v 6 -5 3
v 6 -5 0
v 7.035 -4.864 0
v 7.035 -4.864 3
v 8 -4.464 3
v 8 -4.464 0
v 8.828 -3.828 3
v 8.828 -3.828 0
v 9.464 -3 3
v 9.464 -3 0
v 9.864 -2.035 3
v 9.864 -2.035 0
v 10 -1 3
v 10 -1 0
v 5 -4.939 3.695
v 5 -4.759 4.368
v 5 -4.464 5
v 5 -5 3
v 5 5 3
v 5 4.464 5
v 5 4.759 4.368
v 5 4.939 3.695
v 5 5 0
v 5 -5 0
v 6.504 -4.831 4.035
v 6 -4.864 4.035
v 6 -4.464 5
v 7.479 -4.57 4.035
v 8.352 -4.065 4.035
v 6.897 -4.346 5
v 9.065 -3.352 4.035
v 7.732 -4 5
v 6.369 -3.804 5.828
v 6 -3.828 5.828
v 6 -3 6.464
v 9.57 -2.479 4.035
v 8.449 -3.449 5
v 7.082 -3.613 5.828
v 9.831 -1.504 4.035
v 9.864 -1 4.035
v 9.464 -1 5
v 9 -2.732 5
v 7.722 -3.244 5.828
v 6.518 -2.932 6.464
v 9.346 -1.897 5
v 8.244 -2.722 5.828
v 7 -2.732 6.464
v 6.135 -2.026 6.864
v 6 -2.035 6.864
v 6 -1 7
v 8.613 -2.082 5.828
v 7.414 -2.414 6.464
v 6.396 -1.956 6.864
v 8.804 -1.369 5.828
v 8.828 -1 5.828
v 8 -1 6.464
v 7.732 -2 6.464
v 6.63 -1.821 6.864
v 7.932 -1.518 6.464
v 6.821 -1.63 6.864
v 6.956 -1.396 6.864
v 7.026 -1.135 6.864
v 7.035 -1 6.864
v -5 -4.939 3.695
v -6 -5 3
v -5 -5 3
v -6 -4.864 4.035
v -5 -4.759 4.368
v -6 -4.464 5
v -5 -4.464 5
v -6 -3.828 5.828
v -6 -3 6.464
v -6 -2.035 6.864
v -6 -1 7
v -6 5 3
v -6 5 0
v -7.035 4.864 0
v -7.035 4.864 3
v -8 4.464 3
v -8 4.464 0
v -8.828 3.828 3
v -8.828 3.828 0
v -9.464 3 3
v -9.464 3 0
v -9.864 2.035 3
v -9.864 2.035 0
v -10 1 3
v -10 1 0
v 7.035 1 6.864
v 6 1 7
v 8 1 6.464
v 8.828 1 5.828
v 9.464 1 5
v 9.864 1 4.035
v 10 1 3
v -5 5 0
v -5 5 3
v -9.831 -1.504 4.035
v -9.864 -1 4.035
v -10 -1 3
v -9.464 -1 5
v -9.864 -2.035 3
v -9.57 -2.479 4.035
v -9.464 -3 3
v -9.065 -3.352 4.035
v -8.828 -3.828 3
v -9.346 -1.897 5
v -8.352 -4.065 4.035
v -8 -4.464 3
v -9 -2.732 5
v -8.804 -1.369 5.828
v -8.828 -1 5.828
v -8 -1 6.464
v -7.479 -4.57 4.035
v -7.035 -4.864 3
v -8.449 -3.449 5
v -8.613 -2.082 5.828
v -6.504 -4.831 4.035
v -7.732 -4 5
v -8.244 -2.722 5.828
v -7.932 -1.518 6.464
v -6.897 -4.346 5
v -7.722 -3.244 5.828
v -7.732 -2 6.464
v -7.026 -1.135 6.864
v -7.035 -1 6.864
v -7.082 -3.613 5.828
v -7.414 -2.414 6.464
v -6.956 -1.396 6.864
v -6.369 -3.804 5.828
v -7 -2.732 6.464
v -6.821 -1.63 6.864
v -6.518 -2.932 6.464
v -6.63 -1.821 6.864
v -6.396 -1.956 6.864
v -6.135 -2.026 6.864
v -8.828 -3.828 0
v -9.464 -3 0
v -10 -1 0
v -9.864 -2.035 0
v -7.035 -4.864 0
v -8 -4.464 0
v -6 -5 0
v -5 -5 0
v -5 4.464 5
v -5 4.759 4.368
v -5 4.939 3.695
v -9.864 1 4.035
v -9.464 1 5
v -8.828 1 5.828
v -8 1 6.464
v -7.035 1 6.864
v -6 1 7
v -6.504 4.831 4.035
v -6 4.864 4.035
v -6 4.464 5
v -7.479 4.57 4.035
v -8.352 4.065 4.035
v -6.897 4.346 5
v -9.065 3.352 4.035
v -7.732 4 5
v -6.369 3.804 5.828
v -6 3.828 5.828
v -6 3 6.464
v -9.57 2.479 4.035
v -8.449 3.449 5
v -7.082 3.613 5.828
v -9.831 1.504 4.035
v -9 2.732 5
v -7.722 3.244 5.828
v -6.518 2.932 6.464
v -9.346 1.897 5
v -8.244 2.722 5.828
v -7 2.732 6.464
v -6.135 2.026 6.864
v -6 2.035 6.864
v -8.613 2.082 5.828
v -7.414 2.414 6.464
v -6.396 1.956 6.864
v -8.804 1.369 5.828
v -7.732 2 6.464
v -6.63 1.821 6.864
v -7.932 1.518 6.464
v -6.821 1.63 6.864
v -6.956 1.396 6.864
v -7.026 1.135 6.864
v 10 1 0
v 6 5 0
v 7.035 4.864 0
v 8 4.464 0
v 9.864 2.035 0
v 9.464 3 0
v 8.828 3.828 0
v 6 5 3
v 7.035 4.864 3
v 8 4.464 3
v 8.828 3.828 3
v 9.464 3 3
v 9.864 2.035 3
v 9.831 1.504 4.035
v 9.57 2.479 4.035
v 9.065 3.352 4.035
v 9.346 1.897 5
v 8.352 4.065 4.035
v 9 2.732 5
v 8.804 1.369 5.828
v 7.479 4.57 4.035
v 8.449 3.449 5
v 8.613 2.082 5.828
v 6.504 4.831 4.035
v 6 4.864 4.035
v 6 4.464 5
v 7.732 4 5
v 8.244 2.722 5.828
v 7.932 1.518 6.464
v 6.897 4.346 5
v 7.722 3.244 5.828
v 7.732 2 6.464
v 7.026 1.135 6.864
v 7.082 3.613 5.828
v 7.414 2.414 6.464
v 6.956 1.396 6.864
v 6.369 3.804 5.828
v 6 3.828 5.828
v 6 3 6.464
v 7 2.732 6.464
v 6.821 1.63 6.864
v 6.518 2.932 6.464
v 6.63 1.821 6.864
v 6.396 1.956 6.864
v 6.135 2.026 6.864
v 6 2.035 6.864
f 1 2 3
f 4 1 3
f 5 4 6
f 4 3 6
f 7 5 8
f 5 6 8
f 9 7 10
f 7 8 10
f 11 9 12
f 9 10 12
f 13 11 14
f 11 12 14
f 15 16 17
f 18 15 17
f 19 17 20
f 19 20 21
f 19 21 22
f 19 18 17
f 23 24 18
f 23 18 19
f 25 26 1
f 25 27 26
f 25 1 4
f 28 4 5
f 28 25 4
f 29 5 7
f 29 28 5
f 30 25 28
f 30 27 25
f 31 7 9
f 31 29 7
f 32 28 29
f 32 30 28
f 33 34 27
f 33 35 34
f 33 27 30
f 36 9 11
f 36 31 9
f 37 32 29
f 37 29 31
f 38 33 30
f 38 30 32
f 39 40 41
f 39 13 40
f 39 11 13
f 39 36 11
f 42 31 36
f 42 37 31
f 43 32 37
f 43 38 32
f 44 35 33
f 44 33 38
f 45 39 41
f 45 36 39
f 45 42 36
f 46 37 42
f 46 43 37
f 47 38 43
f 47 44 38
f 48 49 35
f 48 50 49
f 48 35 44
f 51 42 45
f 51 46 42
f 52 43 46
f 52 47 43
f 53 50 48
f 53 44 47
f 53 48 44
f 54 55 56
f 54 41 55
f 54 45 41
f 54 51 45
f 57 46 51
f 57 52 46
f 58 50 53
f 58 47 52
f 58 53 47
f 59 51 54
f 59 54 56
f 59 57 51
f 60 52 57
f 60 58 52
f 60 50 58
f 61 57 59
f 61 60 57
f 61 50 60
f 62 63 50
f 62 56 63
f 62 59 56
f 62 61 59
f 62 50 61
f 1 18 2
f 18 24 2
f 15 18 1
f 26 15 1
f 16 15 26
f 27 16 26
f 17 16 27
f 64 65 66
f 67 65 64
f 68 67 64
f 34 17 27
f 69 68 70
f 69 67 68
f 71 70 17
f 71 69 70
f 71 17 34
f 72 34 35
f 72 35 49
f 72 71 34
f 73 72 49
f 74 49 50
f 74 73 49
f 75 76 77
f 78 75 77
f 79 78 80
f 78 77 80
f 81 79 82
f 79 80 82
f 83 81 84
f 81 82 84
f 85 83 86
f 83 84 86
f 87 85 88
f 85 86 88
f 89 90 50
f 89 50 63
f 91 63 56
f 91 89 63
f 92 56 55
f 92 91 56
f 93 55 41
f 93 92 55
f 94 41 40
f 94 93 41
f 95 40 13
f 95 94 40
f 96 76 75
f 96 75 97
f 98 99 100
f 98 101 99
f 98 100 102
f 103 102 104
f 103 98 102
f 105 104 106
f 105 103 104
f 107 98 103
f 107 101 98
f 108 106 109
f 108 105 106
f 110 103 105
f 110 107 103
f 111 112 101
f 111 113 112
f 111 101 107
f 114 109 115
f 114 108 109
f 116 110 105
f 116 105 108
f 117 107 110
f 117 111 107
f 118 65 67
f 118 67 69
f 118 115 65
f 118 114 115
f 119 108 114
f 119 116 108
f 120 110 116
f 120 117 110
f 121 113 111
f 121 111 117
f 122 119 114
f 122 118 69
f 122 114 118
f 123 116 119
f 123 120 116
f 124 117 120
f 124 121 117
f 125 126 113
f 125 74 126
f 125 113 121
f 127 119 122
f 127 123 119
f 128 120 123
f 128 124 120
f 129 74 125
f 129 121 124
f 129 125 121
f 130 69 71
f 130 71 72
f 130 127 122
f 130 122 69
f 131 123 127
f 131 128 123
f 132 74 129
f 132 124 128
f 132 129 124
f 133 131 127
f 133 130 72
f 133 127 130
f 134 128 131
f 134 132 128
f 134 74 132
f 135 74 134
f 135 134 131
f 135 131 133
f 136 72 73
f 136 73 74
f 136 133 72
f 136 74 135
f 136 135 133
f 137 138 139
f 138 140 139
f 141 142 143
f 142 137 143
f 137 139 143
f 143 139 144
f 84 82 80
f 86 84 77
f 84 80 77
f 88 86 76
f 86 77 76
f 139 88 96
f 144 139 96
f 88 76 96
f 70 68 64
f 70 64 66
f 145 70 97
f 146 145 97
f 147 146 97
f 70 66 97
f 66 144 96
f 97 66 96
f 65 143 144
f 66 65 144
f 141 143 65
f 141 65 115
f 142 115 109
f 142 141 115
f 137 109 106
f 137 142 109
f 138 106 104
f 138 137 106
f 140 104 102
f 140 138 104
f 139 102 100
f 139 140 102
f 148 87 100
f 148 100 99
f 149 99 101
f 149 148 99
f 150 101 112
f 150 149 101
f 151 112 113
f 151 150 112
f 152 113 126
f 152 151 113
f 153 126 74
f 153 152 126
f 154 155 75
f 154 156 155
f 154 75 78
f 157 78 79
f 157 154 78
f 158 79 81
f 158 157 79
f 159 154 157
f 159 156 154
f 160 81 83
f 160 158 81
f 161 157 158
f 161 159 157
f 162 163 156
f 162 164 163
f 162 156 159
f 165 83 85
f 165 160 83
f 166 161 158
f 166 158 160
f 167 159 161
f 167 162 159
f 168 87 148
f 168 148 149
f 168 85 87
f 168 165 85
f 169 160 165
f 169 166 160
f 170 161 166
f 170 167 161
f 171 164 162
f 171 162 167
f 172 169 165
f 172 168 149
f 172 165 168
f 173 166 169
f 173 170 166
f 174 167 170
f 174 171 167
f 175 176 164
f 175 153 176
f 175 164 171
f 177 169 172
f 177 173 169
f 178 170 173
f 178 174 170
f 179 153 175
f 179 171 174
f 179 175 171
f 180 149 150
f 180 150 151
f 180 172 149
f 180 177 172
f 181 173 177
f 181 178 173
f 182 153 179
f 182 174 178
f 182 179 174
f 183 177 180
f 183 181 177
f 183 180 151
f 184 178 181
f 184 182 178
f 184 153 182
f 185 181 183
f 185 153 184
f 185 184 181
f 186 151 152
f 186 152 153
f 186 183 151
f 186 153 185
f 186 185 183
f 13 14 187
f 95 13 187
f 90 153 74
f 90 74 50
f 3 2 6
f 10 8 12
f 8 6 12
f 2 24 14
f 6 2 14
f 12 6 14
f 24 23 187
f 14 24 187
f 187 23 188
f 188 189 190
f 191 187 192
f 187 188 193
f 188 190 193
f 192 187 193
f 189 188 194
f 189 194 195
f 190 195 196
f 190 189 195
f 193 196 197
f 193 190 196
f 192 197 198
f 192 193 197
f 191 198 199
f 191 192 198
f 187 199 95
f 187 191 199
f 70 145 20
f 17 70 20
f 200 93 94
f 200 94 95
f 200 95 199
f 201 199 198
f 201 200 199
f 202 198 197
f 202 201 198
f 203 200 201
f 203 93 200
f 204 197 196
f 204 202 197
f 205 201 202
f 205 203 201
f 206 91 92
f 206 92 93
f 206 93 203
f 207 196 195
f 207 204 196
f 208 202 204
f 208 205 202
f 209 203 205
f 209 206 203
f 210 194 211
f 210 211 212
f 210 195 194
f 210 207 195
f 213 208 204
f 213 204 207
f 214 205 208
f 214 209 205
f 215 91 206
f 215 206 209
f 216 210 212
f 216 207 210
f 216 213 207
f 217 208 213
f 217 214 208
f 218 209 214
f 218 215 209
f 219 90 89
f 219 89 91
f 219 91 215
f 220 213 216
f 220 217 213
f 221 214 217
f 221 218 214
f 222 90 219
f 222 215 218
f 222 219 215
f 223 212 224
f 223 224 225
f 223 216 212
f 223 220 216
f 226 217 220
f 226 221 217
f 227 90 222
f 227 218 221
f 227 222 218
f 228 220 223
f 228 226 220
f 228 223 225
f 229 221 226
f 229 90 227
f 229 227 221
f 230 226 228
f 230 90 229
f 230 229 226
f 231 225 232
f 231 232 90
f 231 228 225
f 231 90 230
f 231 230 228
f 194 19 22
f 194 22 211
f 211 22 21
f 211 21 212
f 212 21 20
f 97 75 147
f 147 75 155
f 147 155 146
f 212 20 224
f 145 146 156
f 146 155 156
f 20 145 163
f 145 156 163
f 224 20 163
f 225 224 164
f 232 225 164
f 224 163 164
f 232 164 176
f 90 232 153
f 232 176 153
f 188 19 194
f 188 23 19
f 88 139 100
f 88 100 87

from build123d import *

# Parameters (mm, degrees)
F0_W         = 5
F0_H         = 10
F1_DEPTH     = 5
F2_W         = 20
F2_H         = 10
F3_DEPTH     = 2
F4_T1_DEPTH  = 2
F4_T3_DEPTH  = 12
F4_T5_DEPTH  = 13
F4_S9_W      = 4
F4_S9_H      = 4
F4_T10_DEPTH = 4
F4_S15_W     = 4
F4_S15_H     = 4
F4_T16_DEPTH = 4
F4_S21_W     = 4
F4_S21_H     = 4
F4_T22_DEPTH = 4
F4_S27_W     = 4
F4_S27_H     = 4
F4_T28_DEPTH = 4


# Not quite as in the source:
# - a fillet or chamfer that OpenCascade refuses, or shapes differently, is made with other operations: its cross-section is extruded or revolved along the edge and cut away or added


with BuildPart() as f1:
    # F0 (on Top) → F1 (new body)
    with BuildSketch(Plane.XY):
        with Locations((-7.5, 0)):
            Rectangle(F0_W, F0_H)
    extrude(amount=F1_DEPTH)



with BuildPart() as f1b:
    # F0 (on Top) → F1, piece 2 (new body)
    with BuildSketch(Plane.XY):
        with Locations((7.5, 0)):
            Rectangle(F0_W, F0_H)
    extrude(amount=F1_DEPTH)


with BuildPart() as f1_1:
    add(f1.part)

    add(f1b.part)  # F3 merges F1b
    # F2 (on face) → F3 (join)
    with BuildSketch(Plane.XY.offset(5)):
        Rectangle(F2_W, F2_H)
    extrude(amount=F3_DEPTH)

    # F4: fillet of radius 4 on 8 edges, made by hand

    # F4_s2 → F4_t1 (cut)
    with BuildSketch(Plane.XZ.offset(-1)):
        with BuildLine():
            ThreePointArc((-10, 3), (-8.8284271247, 5.8284271247), (-6, 7))
            Line((-6, 7), (-10, 7))
            Line((-10, 7), (-10, 3))
        make_face()
        with BuildLine():
            ThreePointArc((6, 7), (8.8284271247, 5.8284271247), (10, 3))
            Line((10, 3), (10, 7))
            Line((10, 7), (6, 7))
        make_face()
    extrude(amount=F4_T1_DEPTH, mode=Mode.SUBTRACT)

    # F4_s4 → F4_t3 (cut)
    with BuildSketch(Plane.YZ.offset(-6)):
        with BuildLine():
            ThreePointArc((-5, 3), (-3.8284271247, 5.8284271247), (-1, 7))
            Line((-1, 7), (-5, 7))
            Line((-5, 7), (-5, 3))
        make_face()
        with BuildLine():
            ThreePointArc((5, 3), (3.8284271247, 5.8284271247), (1, 7))
            Line((1, 7), (5, 7))
            Line((5, 7), (5, 3))
        make_face()
    extrude(amount=F4_T3_DEPTH, mode=Mode.SUBTRACT)

    # F4_s6 → F4_t5 (cut)
    with BuildSketch(Plane.XY.offset(-10)):
        with BuildLine():
            ThreePointArc((6, -5), (8.8284271247, -3.8284271247), (10, -1))
            Line((10, -1), (10, -5))
            Line((10, -5), (6, -5))
        make_face()
        with BuildLine():
            ThreePointArc((6, 5), (8.8284271247, 3.8284271247), (10, 1))
            Line((10, 1), (10, 5))
            Line((10, 5), (6, 5))
        make_face()
        with BuildLine():
            ThreePointArc((-6, 5), (-8.8284271247, 3.8284271247), (-10, 1))
            Line((-10, 1), (-10, 5))
            Line((-10, 5), (-6, 5))
        make_face()
        with BuildLine():
            ThreePointArc((-6, -5), (-8.8284271247, -3.8284271247), (-10, -1))
            Line((-10, -1), (-10, -5))
            Line((-10, -5), (-6, -5))
        make_face()
    extrude(amount=F4_T5_DEPTH, mode=Mode.SUBTRACT)


with BuildPart() as f4_tool8:
    # F4_s9 → F4_t10 (new body)
    with BuildSketch(Plane.XY.offset(3)):
        with Locations((-8, 3)):
            Rectangle(F4_S9_W, F4_S9_H)
    extrude(amount=F4_T10_DEPTH)

    # F4_s11 → F4_t12 (revolve, cut)
    with BuildSketch(Plane(origin=(-6, 1, 3), x_dir=(0.7071067812, -0.7071067812, 0), z_dir=(-0.7071067812, -0.7071067812, 0))):
        with BuildLine():
            ThreePointArc((0, -4), (4, 0), (0, 4))
            Line((0, 4), (0, -4))
        make_face()
    revolve(axis=Axis((-6, 1, 3), (0, 0, 1)), mode=Mode.SUBTRACT)


with BuildPart() as f1_2:
    add(f1_1.part)

    # F4_t7: cut F4_tool8
    add(f4_tool8.part, mode=Mode.SUBTRACT)


with BuildPart() as f4_tool14:
    # F4_s15 → F4_t16 (new body)
    with BuildSketch(Plane.XY.offset(3)):
        with Locations((-8, -3)):
            Rectangle(F4_S15_W, F4_S15_H)
    extrude(amount=F4_T16_DEPTH)

    # F4_s17 → F4_t18 (revolve, cut)
    with BuildSketch(Plane(origin=(-6, -1, 3), x_dir=(0.7071067812, 0.7071067812, 0), z_dir=(0.7071067812, -0.7071067812, 0))):
        with BuildLine():
            ThreePointArc((0, -4), (4, 0), (0, 4))
            Line((0, 4), (0, -4))
        make_face()
    revolve(axis=Axis((-6, -1, 3), (0, 0, 1)), mode=Mode.SUBTRACT)


with BuildPart() as f1_3:
    add(f1_2.part)

    # F4_t13: cut F4_tool14
    add(f4_tool14.part, mode=Mode.SUBTRACT)


with BuildPart() as f4_tool20:
    # F4_s21 → F4_t22 (new body)
    with BuildSketch(Plane.XY.offset(3)):
        with Locations((8, -3)):
            Rectangle(F4_S21_W, F4_S21_H)
    extrude(amount=F4_T22_DEPTH)

    # F4_s23 → F4_t24 (revolve, cut)
    with BuildSketch(Plane(origin=(6, -1, 3), x_dir=(-0.7071067812, 0.7071067812, 0), z_dir=(0.7071067812, 0.7071067812, 0))):
        with BuildLine():
            ThreePointArc((0, -4), (4, 0), (0, 4))
            Line((0, 4), (0, -4))
        make_face()
    revolve(axis=Axis((6, -1, 3), (0, 0, 1)), mode=Mode.SUBTRACT)


with BuildPart() as f1_4:
    add(f1_3.part)

    # F4_t19: cut F4_tool20
    add(f4_tool20.part, mode=Mode.SUBTRACT)


with BuildPart() as f4_tool26:
    # F4_s27 → F4_t28 (new body)
    with BuildSketch(Plane.XY.offset(3)):
        with Locations((8, 3)):
            Rectangle(F4_S27_W, F4_S27_H)
    extrude(amount=F4_T28_DEPTH)

    # F4_s29 → F4_t30 (revolve, cut)
    with BuildSketch(Plane(origin=(6, 1, 3), x_dir=(-0.7071067812, -0.7071067812, 0), z_dir=(-0.7071067812, 0.7071067812, 0))):
        with BuildLine():
            ThreePointArc((0, -4), (4, 0), (0, 4))
            Line((0, 4), (0, -4))
        make_face()
    revolve(axis=Axis((6, 1, 3), (0, 0, 1)), mode=Mode.SUBTRACT)


with BuildPart() as f1_5:
    add(f1_4.part)

    # F4_t25: cut F4_tool26
    add(f4_tool26.part, mode=Mode.SUBTRACT)


solid = f1_5.part
